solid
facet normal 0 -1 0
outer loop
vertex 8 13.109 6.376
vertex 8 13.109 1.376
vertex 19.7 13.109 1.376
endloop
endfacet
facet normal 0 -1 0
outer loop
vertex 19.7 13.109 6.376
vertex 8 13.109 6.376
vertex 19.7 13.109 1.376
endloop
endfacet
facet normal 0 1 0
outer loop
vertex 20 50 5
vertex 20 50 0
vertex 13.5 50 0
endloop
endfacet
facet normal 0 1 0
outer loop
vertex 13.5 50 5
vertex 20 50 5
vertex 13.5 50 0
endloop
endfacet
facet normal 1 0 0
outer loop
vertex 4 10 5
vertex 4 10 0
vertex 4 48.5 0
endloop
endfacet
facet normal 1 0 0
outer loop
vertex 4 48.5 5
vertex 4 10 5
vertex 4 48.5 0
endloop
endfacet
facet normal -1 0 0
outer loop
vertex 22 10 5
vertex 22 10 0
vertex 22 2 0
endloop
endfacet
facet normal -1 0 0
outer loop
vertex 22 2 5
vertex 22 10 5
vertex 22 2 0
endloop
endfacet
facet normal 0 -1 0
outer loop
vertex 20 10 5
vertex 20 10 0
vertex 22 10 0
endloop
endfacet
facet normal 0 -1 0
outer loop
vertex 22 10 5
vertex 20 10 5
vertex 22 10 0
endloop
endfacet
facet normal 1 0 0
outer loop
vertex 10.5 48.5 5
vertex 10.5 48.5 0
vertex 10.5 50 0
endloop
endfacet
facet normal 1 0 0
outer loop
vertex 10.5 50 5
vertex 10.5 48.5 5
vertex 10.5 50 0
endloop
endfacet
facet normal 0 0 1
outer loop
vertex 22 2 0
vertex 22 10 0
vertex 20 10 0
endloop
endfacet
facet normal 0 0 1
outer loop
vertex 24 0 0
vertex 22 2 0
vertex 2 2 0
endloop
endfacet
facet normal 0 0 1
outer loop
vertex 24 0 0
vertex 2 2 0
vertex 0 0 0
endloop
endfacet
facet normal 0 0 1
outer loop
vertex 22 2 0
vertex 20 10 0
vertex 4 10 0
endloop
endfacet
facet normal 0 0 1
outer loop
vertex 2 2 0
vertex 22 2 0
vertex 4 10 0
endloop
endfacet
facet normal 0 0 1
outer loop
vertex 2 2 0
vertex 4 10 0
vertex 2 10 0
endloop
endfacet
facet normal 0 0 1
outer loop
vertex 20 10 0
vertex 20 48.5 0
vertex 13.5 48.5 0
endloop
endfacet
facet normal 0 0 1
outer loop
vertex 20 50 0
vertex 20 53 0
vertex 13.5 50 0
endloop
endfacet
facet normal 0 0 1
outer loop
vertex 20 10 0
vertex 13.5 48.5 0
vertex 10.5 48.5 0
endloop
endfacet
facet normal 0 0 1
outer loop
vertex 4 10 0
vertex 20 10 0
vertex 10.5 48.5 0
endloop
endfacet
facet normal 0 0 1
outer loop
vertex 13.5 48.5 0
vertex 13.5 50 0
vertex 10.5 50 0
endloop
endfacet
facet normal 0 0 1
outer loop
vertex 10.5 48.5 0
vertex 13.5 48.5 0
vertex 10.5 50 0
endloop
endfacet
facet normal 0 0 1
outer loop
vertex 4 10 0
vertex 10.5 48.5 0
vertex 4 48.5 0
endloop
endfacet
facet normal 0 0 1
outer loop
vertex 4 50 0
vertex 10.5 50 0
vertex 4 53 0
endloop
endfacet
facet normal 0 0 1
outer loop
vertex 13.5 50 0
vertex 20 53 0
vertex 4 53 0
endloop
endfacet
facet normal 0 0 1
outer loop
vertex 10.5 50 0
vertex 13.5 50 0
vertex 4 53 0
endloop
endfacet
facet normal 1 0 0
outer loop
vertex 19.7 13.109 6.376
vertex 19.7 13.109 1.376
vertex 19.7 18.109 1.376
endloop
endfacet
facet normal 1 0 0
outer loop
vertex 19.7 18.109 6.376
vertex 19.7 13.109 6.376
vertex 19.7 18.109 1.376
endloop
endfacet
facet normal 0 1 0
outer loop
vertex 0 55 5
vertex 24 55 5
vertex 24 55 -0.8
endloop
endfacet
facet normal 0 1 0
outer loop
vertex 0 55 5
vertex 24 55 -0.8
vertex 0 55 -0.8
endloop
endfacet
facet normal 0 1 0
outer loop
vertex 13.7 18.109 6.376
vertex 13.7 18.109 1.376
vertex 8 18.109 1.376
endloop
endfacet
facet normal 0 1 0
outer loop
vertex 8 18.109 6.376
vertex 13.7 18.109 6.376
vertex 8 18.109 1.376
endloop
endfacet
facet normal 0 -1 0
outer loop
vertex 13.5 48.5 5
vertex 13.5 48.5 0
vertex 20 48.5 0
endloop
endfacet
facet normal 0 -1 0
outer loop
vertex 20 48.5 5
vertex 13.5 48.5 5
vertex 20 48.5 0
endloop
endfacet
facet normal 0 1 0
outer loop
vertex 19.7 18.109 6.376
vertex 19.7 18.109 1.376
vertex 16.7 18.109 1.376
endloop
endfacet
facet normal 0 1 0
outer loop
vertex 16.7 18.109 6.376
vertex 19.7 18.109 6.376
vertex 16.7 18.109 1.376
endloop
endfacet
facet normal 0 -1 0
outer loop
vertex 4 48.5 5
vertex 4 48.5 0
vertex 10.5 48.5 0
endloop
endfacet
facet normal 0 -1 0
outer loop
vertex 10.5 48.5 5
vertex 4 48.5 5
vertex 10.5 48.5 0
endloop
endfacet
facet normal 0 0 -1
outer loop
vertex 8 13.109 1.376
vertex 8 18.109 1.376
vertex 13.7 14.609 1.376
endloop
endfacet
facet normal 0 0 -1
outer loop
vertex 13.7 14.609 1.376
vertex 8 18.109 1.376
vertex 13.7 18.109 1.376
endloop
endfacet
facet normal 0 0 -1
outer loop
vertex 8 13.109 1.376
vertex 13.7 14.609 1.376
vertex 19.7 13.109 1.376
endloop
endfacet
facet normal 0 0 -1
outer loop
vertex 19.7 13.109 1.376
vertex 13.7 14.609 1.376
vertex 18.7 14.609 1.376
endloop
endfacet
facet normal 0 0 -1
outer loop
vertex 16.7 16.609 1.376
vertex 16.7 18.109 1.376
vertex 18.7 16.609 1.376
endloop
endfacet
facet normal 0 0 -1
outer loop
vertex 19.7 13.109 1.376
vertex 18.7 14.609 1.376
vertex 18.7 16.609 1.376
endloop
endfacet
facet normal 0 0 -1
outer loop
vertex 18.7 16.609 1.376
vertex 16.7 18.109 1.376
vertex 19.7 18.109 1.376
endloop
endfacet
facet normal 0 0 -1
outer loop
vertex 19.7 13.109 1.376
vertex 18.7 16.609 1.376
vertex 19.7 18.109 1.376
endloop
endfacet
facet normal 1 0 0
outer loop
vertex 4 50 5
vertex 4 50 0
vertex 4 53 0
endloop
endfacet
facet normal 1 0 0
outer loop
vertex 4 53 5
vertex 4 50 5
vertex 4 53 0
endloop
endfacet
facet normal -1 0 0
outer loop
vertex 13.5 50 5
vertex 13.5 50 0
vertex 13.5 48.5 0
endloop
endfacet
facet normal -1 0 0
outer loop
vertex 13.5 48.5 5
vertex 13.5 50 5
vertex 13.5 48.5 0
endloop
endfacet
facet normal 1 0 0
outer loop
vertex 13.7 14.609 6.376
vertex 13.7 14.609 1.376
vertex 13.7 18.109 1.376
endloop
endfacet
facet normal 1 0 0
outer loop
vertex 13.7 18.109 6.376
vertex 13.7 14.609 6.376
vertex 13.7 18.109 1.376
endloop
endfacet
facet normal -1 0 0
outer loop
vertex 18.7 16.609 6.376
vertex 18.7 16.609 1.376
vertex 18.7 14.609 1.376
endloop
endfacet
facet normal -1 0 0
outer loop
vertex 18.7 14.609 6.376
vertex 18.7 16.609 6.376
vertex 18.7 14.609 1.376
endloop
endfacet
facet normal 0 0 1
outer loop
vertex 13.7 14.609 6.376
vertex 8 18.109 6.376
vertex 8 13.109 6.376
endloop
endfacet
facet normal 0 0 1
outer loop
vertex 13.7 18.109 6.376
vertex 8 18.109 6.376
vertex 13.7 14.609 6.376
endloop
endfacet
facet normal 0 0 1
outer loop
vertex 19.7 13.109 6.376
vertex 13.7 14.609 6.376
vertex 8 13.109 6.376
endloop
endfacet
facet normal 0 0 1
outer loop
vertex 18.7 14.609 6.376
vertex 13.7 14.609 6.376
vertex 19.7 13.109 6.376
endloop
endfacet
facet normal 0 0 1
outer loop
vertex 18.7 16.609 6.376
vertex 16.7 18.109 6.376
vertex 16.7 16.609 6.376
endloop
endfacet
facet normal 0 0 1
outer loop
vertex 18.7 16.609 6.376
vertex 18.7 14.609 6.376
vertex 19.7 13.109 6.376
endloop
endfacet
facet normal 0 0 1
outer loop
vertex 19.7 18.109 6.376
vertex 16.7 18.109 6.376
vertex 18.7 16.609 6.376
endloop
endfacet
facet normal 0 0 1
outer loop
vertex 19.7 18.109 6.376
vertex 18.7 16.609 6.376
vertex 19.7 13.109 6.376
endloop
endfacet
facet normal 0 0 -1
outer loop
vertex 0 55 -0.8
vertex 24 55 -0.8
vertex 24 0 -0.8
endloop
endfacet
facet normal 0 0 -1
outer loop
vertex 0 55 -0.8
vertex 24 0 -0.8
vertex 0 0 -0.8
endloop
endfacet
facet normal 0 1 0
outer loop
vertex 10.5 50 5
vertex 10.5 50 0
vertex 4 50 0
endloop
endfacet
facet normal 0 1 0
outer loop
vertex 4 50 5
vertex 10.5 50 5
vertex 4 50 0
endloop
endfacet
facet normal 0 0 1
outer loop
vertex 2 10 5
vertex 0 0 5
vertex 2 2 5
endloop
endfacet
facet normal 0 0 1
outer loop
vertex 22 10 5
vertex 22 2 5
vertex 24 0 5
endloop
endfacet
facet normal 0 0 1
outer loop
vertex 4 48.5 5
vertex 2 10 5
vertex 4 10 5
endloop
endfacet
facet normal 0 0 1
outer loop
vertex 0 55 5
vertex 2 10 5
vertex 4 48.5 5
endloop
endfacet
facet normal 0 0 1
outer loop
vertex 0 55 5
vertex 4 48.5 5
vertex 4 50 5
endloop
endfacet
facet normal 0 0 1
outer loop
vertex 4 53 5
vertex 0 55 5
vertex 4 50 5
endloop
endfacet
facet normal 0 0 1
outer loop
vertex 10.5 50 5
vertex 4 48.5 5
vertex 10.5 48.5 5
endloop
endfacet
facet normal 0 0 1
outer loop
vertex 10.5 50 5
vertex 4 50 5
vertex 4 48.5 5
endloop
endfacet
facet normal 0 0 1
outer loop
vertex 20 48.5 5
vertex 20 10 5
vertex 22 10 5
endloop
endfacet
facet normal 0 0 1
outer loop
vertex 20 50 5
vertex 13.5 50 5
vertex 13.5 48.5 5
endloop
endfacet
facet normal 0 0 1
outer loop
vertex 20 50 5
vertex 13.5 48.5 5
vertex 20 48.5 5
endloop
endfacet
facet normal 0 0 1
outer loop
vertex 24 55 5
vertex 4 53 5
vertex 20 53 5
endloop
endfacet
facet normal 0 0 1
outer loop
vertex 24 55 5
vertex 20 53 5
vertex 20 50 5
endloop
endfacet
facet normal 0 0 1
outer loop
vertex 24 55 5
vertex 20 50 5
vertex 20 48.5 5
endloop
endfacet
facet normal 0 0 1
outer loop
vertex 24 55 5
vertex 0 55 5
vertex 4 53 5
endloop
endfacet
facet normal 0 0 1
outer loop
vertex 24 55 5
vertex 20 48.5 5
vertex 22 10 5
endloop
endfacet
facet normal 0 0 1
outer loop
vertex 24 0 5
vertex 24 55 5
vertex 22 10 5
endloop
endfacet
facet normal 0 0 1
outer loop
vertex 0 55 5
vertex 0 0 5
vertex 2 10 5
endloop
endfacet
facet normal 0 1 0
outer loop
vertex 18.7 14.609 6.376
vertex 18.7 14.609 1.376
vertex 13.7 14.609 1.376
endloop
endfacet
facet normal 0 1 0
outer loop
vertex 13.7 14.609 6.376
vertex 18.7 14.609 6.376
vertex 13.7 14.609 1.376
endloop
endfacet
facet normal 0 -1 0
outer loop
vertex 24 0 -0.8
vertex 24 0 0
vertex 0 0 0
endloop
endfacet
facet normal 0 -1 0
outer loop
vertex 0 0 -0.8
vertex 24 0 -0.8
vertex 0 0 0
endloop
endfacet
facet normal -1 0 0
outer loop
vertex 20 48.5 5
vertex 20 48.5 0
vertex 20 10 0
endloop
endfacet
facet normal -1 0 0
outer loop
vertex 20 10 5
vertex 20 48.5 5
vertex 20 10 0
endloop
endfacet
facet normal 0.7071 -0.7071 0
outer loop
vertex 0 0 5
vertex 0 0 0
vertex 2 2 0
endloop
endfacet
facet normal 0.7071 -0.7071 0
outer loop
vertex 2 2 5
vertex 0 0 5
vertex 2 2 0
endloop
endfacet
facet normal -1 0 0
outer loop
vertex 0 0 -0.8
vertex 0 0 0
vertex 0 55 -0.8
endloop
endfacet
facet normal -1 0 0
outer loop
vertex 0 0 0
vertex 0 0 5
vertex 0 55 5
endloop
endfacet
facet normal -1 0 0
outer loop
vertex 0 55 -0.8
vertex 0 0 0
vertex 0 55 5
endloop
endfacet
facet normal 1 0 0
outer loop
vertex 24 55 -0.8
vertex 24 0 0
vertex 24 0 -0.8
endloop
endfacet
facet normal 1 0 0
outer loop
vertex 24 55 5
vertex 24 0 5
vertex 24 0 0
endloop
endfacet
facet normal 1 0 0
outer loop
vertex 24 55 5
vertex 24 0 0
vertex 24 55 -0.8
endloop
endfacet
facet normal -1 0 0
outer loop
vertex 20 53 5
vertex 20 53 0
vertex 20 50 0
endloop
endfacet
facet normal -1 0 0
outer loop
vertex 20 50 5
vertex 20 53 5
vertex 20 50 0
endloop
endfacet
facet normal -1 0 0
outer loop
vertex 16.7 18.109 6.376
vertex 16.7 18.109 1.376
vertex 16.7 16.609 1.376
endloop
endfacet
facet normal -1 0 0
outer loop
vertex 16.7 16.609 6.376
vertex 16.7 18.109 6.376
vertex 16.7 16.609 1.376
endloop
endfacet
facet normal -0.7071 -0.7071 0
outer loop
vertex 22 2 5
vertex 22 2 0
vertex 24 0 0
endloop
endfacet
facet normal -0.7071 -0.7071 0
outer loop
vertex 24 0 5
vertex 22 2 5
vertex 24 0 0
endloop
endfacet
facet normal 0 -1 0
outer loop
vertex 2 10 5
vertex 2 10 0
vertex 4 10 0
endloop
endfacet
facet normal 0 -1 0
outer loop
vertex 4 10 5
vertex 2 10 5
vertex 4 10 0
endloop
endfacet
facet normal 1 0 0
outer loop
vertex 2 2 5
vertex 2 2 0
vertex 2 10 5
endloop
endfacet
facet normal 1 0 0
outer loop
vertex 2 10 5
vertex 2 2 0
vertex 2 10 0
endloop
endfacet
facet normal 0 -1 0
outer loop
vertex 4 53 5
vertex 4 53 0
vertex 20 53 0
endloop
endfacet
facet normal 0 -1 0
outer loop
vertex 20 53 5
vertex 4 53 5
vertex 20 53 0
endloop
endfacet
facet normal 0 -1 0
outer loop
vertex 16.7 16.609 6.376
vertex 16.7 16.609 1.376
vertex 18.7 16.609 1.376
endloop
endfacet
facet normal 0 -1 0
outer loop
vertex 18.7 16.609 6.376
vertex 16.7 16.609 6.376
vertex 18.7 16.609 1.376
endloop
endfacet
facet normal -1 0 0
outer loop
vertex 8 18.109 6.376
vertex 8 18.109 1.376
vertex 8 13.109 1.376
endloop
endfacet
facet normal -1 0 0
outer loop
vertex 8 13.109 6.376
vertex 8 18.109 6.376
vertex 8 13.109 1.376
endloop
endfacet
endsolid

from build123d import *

# Parameters (mm, degrees)
BOSS_EXTRUDE1_DEPTH   = 5
BOSS_EXTRUDE1_2_DEPTH = 5
SKETCH2_W             = 24
SKETCH2_H             = 55
BOSS_EXTRUDE2_DEPTH   = 0.8
SPLIT1_DEPTH          = 5
SPLIT1_2_DEPTH        = 5


# Read off the part's stored shape, not the designer's step: Split1
with BuildPart() as part:
    # Sketch1 → Boss-Extrude1 (new body)
    with BuildSketch(Plane.XY):
        Polygon((4, 53), (20, 53), (20, 50), (13.5, 50), (13.5, 48.5), (20, 48.5), (20, 10), (22, 10), (22, 2), (24, 0), (24, 55), (0, 55), (0, 0), (2, 2), (2, 10), (4, 10), (4, 48.5), (10.5, 48.5), (10.5, 50), (4, 50), align=None)
    extrude(amount=BOSS_EXTRUDE1_DEPTH)



with BuildPart() as body_2:
    # Sketch1 → Boss-Extrude1 2 (new body)
    with BuildSketch(Plane.XY):
        Polygon((8, 18.109227635), (13.7, 18.109227635), (13.7, 17.909227635), (13.7, 14.609227635), (18.7, 14.609227635), (18.7, 16.609227635), (16.7, 16.609227635), (16.7, 18.109227635), (19.7, 18.109227635), (19.7, 13.109227635), (8, 13.109227635), align=None)
    extrude(amount=BOSS_EXTRUDE1_2_DEPTH)


with BuildPart() as part_1:
    add(part.part)

    add(body_2.part)  # Boss-Extrude2 merges body 2
    # Sketch2 → Boss-Extrude2 (add)
    with BuildSketch(Plane(origin=(0, 0, 0), x_dir=(-1, 0, 0), z_dir=(0, 0, -1))):
        with Locations((-12, 27.5)):
            Rectangle(SKETCH2_W, SKETCH2_H)
    extrude(amount=BOSS_EXTRUDE2_DEPTH)

    # Split1 outline → Split1 (cut)
    with BuildSketch(Plane.XY):
        Polygon((8, 18.109227635), (8, 13.109227635), (19.7, 13.109227635), (19.7, 18.109227635), (16.7, 18.109227635), (16.7, 16.609227635), (18.7, 16.609227635), (18.7, 14.609227635), (13.7, 14.609227635), (13.7, 18.109227635), align=None)
    extrude(amount=SPLIT1_DEPTH, mode=Mode.SUBTRACT)


with BuildPart() as body_2_2:
    # Split1 2 outline → Split1 2 (new body)
    with BuildSketch(Plane.XY):
        Polygon((8, 13.109227635), (19.7, 13.109227635), (19.7, 18.109227635), (16.7, 18.109227635), (16.7, 16.609227635), (18.7, 16.609227635), (18.7, 14.609227635), (13.7, 14.609227635), (13.7, 18.109227635), (8, 18.109227635), align=None)
    extrude(amount=SPLIT1_2_DEPTH)


with BuildPart() as body_2_2_1:
    # Body-Move/Copy1: moved
    add(body_2_2.part.moved(Location((0, 0, 1.376257347))))


solid = Compound([part_1.part, body_2_2_1.part])
